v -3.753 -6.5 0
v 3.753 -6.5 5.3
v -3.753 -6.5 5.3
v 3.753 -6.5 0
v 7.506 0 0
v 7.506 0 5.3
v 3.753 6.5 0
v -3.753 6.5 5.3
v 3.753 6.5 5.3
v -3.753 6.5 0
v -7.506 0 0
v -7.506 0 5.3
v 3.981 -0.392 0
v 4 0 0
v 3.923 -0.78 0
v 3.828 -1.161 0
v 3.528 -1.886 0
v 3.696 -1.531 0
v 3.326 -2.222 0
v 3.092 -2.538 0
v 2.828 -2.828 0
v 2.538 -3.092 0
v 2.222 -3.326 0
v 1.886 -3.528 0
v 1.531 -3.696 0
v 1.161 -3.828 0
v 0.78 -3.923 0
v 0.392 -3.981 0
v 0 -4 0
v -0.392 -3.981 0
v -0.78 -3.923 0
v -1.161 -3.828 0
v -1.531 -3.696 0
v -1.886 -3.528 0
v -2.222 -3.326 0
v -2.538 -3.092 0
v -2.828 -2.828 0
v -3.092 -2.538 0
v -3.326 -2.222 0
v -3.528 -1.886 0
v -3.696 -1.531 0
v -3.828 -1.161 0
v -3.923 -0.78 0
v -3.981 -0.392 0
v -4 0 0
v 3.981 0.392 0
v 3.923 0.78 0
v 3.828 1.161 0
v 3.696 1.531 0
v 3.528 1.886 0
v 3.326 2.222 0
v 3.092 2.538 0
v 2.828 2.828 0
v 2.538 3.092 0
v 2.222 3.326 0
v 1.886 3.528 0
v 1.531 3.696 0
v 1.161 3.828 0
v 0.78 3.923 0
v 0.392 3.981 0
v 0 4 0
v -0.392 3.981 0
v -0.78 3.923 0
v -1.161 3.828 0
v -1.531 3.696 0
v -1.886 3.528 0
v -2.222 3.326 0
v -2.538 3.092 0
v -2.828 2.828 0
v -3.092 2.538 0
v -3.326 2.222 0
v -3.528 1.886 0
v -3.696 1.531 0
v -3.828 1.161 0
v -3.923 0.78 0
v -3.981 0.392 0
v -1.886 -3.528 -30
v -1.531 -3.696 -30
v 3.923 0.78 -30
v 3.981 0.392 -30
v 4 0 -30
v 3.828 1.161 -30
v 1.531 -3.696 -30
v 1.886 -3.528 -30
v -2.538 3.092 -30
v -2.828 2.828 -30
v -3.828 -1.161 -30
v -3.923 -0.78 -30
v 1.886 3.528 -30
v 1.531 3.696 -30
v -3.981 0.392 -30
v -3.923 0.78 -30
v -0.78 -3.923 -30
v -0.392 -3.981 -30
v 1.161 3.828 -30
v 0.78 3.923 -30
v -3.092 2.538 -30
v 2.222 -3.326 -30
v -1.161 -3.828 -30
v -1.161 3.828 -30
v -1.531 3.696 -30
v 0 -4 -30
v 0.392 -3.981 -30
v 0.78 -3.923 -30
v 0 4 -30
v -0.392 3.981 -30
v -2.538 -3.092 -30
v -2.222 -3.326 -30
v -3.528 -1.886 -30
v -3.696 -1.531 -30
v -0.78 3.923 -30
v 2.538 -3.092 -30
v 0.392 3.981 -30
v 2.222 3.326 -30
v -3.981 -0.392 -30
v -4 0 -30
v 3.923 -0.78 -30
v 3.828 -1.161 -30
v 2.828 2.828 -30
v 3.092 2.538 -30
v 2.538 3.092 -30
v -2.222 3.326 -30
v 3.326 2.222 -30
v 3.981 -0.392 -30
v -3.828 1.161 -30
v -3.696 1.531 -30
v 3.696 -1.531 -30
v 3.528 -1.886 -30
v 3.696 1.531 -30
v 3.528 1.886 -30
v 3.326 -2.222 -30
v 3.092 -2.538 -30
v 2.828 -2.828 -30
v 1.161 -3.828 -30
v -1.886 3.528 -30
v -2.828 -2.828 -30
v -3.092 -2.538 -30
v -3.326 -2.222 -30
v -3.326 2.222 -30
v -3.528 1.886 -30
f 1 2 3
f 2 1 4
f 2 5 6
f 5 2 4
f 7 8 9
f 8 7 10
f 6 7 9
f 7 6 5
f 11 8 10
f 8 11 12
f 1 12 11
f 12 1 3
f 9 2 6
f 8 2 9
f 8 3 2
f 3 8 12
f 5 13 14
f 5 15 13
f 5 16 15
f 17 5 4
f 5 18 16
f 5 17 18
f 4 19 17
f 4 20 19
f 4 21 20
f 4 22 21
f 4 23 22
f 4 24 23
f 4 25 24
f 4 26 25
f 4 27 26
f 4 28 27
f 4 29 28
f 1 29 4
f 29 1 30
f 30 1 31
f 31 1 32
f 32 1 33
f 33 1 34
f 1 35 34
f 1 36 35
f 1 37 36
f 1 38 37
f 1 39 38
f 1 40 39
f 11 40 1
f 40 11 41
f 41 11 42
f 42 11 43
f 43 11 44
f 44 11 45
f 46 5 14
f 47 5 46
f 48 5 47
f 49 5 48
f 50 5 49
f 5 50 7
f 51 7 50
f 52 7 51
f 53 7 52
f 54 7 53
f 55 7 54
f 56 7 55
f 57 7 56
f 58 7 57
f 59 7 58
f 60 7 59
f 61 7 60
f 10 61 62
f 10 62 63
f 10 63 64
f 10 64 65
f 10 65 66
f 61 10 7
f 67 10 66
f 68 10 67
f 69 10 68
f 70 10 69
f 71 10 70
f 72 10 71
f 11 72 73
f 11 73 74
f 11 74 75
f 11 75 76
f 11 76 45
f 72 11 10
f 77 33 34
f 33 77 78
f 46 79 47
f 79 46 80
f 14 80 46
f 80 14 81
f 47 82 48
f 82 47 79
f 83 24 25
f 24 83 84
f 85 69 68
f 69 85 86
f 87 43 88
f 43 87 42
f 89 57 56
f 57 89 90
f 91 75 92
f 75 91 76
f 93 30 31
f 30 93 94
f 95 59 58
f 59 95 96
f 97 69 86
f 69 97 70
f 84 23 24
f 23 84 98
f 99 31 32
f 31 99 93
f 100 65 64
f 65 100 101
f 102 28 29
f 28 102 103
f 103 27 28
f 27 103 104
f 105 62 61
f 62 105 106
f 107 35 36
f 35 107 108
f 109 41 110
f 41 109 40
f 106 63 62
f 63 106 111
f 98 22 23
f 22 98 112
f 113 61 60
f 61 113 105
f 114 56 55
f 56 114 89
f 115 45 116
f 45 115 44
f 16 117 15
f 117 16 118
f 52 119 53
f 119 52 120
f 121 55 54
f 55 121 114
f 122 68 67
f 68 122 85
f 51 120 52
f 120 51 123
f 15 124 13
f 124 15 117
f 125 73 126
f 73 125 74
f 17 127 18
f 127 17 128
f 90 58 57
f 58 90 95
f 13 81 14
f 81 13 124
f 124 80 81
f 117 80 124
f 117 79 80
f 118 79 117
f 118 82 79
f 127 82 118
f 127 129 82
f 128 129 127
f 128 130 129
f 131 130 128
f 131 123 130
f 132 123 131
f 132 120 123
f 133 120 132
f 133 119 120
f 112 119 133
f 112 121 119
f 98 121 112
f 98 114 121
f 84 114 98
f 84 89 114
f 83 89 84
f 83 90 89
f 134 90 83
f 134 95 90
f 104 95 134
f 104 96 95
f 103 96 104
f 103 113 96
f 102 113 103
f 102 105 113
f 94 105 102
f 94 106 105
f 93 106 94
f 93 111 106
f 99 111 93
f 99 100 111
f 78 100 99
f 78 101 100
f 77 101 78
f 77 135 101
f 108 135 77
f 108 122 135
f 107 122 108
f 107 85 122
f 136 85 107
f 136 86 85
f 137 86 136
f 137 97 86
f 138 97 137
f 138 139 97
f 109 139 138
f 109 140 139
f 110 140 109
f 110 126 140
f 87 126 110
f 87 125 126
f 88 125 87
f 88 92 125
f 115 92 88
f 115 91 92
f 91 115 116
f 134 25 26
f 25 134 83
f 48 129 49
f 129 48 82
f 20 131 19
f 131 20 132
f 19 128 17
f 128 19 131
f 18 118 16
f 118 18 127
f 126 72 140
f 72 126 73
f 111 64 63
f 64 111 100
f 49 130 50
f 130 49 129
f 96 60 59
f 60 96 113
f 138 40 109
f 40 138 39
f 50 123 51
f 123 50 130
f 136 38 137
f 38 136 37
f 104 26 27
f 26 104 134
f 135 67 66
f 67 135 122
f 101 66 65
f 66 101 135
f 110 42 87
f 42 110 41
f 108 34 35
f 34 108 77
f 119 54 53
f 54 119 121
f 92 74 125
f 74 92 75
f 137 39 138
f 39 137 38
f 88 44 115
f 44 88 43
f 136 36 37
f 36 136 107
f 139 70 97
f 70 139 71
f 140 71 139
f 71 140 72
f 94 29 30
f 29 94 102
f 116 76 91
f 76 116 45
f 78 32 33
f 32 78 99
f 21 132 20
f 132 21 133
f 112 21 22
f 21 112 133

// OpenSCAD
module m8_hex_bolt() {
    union() {
        cylinder(h = 5.3, r = 13 / 2 / cos(30), $fn = 6);
        
        translate([0, 0, -30]) {
            cylinder(h = 30, d = 8, $fn = 64);
        }
    }
}

m8_hex_bolt();
